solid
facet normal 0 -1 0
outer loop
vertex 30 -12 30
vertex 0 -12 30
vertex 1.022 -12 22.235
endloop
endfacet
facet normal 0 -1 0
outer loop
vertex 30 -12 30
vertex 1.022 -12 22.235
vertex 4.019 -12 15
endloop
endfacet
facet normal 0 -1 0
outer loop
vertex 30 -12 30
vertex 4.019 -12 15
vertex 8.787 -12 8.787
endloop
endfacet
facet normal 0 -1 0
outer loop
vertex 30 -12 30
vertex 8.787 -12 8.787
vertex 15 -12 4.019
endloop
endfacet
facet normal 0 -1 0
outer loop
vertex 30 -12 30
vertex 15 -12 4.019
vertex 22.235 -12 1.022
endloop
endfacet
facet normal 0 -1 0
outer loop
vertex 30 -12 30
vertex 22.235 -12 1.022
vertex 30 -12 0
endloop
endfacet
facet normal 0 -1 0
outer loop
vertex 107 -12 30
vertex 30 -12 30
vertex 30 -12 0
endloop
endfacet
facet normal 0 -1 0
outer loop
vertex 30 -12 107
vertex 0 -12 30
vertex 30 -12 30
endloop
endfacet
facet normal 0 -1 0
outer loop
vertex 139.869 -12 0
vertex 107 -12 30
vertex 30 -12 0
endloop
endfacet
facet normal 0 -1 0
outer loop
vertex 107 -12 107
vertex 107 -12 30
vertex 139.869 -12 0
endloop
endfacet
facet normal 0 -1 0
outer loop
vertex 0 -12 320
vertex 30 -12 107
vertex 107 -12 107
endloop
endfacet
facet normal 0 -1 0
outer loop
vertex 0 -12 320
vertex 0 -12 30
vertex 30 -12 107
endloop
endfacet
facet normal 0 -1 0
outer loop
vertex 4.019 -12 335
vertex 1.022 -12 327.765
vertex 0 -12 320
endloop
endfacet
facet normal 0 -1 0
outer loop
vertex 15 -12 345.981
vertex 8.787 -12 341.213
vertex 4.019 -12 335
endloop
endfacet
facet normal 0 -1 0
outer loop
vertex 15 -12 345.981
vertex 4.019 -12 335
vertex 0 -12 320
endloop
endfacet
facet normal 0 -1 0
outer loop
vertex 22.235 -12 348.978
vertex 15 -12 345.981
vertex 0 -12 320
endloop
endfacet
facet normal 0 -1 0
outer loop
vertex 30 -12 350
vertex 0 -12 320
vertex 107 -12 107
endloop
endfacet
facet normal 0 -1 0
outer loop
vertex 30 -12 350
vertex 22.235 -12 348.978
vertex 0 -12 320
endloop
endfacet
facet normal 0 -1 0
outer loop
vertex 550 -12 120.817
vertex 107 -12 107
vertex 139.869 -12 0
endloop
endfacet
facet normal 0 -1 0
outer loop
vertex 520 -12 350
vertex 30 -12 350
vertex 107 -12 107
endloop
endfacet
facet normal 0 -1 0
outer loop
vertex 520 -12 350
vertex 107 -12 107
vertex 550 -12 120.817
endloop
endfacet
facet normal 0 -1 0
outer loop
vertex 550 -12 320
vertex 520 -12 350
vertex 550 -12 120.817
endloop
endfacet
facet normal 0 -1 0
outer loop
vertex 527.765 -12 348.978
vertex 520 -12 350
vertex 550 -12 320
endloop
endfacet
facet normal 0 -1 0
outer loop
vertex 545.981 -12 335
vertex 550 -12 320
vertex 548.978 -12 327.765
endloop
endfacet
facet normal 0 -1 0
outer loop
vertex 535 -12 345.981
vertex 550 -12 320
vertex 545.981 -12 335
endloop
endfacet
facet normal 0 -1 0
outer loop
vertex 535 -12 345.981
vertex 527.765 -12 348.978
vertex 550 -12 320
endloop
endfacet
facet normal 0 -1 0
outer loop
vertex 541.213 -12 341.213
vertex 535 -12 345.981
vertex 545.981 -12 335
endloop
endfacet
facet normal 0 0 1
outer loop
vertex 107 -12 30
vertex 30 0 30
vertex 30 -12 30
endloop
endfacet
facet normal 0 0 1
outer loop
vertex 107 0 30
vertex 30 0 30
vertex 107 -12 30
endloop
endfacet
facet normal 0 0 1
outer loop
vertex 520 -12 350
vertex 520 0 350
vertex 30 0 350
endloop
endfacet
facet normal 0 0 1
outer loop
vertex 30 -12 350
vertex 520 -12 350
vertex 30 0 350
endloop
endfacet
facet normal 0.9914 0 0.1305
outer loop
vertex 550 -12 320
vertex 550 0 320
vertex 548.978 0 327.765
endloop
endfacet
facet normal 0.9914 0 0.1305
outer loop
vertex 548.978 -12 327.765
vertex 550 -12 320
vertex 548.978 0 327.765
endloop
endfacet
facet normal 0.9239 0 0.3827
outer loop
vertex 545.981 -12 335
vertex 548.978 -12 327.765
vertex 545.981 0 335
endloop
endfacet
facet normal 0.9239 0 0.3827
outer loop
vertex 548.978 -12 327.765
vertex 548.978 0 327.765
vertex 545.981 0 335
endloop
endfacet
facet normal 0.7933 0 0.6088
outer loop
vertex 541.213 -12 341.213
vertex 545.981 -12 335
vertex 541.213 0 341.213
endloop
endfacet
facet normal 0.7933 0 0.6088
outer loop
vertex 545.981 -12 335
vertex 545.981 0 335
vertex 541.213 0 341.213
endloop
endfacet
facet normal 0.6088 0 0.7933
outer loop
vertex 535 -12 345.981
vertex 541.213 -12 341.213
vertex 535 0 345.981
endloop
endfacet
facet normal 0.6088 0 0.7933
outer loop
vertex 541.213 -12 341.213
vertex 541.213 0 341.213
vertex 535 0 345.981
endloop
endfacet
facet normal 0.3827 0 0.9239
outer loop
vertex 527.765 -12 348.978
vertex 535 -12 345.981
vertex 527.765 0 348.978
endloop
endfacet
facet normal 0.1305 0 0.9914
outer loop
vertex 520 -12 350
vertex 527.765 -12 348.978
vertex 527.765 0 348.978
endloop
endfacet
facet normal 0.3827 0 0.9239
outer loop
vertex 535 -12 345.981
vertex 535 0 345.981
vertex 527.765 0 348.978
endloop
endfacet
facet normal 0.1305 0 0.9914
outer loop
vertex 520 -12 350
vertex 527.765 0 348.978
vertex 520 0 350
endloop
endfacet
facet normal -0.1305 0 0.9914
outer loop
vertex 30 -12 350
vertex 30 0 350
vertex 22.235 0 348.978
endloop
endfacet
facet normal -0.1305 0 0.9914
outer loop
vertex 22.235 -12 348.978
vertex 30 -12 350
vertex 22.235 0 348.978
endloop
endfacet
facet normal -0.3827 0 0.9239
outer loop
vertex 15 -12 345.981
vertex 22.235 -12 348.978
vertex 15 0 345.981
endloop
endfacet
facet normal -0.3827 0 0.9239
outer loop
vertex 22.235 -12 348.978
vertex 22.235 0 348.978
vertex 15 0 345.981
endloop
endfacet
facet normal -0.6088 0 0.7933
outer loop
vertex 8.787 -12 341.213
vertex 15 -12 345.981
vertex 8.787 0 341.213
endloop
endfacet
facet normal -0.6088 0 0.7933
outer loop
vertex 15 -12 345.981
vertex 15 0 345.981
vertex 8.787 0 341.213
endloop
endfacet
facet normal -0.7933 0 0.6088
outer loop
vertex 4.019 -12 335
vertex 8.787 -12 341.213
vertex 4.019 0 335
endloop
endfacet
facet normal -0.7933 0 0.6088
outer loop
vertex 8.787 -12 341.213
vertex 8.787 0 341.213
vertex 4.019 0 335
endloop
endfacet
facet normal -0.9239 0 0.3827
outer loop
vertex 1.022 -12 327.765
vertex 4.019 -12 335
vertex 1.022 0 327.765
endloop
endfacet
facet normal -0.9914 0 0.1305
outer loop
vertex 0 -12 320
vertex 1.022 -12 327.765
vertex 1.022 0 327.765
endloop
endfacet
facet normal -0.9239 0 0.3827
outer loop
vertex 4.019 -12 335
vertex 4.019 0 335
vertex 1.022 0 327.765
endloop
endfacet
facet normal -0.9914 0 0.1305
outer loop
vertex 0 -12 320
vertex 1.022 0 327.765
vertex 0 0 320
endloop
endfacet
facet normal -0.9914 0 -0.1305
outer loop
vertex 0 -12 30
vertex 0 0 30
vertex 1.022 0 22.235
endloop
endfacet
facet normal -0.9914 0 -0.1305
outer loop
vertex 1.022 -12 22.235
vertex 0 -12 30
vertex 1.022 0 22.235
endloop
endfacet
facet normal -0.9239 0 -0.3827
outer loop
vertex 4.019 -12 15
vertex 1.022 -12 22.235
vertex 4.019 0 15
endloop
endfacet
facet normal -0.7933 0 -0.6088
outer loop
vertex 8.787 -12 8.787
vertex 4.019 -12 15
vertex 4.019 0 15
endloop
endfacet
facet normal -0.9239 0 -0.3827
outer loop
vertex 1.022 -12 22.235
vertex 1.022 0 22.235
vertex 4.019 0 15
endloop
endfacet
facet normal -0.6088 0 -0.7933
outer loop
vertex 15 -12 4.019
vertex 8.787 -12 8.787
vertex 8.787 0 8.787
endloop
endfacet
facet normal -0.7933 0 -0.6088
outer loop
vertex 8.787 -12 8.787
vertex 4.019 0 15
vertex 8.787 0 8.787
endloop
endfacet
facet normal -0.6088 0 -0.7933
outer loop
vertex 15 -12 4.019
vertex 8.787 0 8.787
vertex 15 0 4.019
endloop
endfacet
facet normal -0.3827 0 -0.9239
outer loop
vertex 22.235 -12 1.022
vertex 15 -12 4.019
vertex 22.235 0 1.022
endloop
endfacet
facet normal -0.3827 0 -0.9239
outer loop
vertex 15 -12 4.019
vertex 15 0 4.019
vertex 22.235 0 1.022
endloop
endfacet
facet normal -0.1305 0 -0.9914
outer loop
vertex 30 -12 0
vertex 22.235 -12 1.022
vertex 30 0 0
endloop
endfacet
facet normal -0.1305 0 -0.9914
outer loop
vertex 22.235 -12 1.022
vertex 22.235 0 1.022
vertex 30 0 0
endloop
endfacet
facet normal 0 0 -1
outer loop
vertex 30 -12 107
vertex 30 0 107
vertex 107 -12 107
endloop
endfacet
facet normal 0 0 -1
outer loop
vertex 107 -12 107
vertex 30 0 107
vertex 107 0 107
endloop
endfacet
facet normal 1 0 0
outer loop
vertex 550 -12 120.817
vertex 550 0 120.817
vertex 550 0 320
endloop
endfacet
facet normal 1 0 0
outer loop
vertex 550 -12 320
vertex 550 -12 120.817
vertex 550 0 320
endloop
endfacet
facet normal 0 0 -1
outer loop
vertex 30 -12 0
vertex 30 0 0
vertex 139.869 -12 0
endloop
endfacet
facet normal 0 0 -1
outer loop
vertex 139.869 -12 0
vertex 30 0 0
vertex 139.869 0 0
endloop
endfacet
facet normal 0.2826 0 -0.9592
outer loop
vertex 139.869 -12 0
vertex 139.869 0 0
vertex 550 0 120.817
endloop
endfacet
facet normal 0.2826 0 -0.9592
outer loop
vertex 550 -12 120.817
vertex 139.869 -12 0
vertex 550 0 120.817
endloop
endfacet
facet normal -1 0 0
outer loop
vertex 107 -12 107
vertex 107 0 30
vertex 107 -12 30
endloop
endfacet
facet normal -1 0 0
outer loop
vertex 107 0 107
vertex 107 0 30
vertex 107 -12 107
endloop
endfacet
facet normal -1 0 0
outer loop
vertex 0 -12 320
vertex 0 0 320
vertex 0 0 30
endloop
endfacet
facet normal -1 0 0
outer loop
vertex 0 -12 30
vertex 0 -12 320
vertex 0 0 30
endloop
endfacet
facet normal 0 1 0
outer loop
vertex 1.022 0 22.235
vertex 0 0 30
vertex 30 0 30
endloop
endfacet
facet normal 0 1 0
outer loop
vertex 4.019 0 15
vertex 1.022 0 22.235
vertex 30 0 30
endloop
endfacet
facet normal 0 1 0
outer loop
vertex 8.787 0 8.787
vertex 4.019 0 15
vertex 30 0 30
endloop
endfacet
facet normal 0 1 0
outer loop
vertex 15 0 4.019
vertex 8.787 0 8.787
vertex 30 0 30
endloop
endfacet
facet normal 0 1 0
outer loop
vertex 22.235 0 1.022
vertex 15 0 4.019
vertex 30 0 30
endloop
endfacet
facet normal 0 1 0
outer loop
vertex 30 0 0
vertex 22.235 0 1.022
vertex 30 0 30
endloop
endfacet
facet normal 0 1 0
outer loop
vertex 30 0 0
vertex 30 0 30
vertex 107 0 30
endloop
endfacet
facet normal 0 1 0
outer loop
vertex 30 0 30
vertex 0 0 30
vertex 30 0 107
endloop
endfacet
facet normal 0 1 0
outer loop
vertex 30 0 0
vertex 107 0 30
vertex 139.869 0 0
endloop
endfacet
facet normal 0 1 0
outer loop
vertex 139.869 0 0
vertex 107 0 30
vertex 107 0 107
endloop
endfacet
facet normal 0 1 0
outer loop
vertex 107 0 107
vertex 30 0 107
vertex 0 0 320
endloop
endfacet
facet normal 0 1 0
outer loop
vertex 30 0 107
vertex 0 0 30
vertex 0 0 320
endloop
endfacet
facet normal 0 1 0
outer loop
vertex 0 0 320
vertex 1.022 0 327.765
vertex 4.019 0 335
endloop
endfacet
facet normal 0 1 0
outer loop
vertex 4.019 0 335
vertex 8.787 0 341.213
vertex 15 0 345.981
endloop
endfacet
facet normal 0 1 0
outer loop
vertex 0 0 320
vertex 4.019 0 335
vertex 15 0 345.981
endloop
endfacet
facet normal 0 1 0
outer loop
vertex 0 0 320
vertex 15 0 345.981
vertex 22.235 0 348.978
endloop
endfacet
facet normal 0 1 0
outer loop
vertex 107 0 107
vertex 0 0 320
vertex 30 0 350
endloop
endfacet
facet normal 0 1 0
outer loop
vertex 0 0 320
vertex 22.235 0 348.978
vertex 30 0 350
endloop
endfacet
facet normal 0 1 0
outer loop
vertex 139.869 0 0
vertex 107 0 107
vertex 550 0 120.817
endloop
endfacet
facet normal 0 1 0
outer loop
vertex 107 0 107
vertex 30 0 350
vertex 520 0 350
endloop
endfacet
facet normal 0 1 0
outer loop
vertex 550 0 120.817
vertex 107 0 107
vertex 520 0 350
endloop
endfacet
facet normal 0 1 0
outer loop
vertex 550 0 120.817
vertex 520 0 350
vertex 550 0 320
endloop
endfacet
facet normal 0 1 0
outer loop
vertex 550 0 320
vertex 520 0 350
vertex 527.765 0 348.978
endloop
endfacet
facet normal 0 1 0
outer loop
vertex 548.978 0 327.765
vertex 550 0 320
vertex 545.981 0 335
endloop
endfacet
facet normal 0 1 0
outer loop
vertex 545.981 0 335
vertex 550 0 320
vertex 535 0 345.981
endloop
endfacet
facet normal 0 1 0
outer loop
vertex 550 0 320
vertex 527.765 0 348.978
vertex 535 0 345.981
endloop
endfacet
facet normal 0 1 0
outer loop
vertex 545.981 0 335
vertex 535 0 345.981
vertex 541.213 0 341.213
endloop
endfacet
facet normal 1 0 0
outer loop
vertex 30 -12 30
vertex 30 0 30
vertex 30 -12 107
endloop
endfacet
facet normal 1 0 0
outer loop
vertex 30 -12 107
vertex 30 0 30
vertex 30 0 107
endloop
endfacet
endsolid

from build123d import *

# Parameters (mm, degrees)
F0_W     = 77
F0_H     = 77
F1_DEPTH = 12


with BuildPart() as f1:
    # F0 (on Front) → F1 (new body)
    with BuildSketch(Plane.XZ):
        with BuildLine():
            ThreePointArc((0, 30), (8.786797, 8.786797), (30, 0))
            Line((30, 0), (139.86896, 0))
            Line((139.86896, 0), (550, 120.816529))
            Line((550, 120.816529), (550, 320))
            ThreePointArc((550, 320), (541.213203, 341.213203), (520, 350))
            Line((520, 350), (30, 350))
            ThreePointArc((30, 350), (8.786797, 341.213203), (0, 320))
            Line((0, 320), (0, 30))
        make_face()
        with Locations((68.5, 68.5)):
            Rectangle(F0_W, F0_H, mode=Mode.SUBTRACT)
    extrude(amount=F1_DEPTH)


solid = f1.part
